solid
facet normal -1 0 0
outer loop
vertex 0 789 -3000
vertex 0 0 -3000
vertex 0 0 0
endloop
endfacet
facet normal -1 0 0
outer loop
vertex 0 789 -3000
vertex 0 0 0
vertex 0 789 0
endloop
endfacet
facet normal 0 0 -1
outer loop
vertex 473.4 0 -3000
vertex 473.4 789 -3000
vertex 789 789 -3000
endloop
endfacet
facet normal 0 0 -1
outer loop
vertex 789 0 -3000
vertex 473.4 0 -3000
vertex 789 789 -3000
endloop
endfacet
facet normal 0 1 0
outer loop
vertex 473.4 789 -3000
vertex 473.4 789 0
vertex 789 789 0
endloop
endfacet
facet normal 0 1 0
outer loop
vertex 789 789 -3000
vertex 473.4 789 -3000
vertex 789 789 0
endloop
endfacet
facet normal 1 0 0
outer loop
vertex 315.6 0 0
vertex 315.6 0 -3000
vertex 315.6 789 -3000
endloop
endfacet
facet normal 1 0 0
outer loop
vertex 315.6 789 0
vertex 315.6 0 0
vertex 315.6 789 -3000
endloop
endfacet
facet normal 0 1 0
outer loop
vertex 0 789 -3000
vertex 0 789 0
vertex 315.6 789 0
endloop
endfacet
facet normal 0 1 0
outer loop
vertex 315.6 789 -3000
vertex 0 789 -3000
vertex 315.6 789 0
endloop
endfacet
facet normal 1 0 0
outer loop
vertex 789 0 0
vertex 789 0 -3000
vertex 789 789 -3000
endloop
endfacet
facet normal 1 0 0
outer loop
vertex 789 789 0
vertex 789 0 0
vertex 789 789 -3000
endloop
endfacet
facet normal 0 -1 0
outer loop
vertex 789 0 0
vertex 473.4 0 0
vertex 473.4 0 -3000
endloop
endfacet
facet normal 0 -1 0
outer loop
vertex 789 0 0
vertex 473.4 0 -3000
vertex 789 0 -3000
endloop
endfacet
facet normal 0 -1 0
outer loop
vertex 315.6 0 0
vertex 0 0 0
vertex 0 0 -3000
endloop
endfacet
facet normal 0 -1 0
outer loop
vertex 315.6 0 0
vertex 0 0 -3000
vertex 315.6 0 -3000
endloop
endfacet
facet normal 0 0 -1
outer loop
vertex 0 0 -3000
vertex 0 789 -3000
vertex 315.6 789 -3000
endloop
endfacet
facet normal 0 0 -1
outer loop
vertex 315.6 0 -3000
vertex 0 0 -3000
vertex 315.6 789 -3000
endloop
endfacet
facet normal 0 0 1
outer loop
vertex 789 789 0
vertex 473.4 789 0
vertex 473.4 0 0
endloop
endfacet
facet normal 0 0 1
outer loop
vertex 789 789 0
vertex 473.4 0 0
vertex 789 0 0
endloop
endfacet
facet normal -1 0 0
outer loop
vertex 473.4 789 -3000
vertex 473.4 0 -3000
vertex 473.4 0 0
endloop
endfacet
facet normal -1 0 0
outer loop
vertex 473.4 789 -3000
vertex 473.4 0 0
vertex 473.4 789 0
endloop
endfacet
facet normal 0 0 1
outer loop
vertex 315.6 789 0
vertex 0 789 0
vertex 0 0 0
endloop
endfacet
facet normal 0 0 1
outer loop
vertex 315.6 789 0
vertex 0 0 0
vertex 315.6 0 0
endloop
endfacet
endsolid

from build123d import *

# Parameters (mm, degrees)
SKETCH_1_W        = 789
SKETCH_1_H        = 789
EXTRUDE_252_DEPTH = 3000
OTHER_START       = 315.6
OTHER_1_OUTLINE_W = 789
OTHER_1_OUTLINE_H = 3000
OTHER_1_DEPTH     = 157.8


# Read off the part's stored shape, not the designer's step: Полость1
with BuildPart() as part:
    # Эскиз1 → Extrude 252 (new body)
    with BuildSketch(Plane.XY):
        with Locations((394.5, 394.5)):
            Rectangle(SKETCH_1_W, SKETCH_1_H)
    extrude(amount=-EXTRUDE_252_DEPTH)

    # Полость1 outline → Полость1 (cut)
    with BuildSketch(Plane.YZ.offset(OTHER_START)):
        with Locations((394.5, -1500)):
            Rectangle(OTHER_1_OUTLINE_W, OTHER_1_OUTLINE_H)
    extrude(amount=OTHER_1_DEPTH, mode=Mode.SUBTRACT)


solid = part.part
